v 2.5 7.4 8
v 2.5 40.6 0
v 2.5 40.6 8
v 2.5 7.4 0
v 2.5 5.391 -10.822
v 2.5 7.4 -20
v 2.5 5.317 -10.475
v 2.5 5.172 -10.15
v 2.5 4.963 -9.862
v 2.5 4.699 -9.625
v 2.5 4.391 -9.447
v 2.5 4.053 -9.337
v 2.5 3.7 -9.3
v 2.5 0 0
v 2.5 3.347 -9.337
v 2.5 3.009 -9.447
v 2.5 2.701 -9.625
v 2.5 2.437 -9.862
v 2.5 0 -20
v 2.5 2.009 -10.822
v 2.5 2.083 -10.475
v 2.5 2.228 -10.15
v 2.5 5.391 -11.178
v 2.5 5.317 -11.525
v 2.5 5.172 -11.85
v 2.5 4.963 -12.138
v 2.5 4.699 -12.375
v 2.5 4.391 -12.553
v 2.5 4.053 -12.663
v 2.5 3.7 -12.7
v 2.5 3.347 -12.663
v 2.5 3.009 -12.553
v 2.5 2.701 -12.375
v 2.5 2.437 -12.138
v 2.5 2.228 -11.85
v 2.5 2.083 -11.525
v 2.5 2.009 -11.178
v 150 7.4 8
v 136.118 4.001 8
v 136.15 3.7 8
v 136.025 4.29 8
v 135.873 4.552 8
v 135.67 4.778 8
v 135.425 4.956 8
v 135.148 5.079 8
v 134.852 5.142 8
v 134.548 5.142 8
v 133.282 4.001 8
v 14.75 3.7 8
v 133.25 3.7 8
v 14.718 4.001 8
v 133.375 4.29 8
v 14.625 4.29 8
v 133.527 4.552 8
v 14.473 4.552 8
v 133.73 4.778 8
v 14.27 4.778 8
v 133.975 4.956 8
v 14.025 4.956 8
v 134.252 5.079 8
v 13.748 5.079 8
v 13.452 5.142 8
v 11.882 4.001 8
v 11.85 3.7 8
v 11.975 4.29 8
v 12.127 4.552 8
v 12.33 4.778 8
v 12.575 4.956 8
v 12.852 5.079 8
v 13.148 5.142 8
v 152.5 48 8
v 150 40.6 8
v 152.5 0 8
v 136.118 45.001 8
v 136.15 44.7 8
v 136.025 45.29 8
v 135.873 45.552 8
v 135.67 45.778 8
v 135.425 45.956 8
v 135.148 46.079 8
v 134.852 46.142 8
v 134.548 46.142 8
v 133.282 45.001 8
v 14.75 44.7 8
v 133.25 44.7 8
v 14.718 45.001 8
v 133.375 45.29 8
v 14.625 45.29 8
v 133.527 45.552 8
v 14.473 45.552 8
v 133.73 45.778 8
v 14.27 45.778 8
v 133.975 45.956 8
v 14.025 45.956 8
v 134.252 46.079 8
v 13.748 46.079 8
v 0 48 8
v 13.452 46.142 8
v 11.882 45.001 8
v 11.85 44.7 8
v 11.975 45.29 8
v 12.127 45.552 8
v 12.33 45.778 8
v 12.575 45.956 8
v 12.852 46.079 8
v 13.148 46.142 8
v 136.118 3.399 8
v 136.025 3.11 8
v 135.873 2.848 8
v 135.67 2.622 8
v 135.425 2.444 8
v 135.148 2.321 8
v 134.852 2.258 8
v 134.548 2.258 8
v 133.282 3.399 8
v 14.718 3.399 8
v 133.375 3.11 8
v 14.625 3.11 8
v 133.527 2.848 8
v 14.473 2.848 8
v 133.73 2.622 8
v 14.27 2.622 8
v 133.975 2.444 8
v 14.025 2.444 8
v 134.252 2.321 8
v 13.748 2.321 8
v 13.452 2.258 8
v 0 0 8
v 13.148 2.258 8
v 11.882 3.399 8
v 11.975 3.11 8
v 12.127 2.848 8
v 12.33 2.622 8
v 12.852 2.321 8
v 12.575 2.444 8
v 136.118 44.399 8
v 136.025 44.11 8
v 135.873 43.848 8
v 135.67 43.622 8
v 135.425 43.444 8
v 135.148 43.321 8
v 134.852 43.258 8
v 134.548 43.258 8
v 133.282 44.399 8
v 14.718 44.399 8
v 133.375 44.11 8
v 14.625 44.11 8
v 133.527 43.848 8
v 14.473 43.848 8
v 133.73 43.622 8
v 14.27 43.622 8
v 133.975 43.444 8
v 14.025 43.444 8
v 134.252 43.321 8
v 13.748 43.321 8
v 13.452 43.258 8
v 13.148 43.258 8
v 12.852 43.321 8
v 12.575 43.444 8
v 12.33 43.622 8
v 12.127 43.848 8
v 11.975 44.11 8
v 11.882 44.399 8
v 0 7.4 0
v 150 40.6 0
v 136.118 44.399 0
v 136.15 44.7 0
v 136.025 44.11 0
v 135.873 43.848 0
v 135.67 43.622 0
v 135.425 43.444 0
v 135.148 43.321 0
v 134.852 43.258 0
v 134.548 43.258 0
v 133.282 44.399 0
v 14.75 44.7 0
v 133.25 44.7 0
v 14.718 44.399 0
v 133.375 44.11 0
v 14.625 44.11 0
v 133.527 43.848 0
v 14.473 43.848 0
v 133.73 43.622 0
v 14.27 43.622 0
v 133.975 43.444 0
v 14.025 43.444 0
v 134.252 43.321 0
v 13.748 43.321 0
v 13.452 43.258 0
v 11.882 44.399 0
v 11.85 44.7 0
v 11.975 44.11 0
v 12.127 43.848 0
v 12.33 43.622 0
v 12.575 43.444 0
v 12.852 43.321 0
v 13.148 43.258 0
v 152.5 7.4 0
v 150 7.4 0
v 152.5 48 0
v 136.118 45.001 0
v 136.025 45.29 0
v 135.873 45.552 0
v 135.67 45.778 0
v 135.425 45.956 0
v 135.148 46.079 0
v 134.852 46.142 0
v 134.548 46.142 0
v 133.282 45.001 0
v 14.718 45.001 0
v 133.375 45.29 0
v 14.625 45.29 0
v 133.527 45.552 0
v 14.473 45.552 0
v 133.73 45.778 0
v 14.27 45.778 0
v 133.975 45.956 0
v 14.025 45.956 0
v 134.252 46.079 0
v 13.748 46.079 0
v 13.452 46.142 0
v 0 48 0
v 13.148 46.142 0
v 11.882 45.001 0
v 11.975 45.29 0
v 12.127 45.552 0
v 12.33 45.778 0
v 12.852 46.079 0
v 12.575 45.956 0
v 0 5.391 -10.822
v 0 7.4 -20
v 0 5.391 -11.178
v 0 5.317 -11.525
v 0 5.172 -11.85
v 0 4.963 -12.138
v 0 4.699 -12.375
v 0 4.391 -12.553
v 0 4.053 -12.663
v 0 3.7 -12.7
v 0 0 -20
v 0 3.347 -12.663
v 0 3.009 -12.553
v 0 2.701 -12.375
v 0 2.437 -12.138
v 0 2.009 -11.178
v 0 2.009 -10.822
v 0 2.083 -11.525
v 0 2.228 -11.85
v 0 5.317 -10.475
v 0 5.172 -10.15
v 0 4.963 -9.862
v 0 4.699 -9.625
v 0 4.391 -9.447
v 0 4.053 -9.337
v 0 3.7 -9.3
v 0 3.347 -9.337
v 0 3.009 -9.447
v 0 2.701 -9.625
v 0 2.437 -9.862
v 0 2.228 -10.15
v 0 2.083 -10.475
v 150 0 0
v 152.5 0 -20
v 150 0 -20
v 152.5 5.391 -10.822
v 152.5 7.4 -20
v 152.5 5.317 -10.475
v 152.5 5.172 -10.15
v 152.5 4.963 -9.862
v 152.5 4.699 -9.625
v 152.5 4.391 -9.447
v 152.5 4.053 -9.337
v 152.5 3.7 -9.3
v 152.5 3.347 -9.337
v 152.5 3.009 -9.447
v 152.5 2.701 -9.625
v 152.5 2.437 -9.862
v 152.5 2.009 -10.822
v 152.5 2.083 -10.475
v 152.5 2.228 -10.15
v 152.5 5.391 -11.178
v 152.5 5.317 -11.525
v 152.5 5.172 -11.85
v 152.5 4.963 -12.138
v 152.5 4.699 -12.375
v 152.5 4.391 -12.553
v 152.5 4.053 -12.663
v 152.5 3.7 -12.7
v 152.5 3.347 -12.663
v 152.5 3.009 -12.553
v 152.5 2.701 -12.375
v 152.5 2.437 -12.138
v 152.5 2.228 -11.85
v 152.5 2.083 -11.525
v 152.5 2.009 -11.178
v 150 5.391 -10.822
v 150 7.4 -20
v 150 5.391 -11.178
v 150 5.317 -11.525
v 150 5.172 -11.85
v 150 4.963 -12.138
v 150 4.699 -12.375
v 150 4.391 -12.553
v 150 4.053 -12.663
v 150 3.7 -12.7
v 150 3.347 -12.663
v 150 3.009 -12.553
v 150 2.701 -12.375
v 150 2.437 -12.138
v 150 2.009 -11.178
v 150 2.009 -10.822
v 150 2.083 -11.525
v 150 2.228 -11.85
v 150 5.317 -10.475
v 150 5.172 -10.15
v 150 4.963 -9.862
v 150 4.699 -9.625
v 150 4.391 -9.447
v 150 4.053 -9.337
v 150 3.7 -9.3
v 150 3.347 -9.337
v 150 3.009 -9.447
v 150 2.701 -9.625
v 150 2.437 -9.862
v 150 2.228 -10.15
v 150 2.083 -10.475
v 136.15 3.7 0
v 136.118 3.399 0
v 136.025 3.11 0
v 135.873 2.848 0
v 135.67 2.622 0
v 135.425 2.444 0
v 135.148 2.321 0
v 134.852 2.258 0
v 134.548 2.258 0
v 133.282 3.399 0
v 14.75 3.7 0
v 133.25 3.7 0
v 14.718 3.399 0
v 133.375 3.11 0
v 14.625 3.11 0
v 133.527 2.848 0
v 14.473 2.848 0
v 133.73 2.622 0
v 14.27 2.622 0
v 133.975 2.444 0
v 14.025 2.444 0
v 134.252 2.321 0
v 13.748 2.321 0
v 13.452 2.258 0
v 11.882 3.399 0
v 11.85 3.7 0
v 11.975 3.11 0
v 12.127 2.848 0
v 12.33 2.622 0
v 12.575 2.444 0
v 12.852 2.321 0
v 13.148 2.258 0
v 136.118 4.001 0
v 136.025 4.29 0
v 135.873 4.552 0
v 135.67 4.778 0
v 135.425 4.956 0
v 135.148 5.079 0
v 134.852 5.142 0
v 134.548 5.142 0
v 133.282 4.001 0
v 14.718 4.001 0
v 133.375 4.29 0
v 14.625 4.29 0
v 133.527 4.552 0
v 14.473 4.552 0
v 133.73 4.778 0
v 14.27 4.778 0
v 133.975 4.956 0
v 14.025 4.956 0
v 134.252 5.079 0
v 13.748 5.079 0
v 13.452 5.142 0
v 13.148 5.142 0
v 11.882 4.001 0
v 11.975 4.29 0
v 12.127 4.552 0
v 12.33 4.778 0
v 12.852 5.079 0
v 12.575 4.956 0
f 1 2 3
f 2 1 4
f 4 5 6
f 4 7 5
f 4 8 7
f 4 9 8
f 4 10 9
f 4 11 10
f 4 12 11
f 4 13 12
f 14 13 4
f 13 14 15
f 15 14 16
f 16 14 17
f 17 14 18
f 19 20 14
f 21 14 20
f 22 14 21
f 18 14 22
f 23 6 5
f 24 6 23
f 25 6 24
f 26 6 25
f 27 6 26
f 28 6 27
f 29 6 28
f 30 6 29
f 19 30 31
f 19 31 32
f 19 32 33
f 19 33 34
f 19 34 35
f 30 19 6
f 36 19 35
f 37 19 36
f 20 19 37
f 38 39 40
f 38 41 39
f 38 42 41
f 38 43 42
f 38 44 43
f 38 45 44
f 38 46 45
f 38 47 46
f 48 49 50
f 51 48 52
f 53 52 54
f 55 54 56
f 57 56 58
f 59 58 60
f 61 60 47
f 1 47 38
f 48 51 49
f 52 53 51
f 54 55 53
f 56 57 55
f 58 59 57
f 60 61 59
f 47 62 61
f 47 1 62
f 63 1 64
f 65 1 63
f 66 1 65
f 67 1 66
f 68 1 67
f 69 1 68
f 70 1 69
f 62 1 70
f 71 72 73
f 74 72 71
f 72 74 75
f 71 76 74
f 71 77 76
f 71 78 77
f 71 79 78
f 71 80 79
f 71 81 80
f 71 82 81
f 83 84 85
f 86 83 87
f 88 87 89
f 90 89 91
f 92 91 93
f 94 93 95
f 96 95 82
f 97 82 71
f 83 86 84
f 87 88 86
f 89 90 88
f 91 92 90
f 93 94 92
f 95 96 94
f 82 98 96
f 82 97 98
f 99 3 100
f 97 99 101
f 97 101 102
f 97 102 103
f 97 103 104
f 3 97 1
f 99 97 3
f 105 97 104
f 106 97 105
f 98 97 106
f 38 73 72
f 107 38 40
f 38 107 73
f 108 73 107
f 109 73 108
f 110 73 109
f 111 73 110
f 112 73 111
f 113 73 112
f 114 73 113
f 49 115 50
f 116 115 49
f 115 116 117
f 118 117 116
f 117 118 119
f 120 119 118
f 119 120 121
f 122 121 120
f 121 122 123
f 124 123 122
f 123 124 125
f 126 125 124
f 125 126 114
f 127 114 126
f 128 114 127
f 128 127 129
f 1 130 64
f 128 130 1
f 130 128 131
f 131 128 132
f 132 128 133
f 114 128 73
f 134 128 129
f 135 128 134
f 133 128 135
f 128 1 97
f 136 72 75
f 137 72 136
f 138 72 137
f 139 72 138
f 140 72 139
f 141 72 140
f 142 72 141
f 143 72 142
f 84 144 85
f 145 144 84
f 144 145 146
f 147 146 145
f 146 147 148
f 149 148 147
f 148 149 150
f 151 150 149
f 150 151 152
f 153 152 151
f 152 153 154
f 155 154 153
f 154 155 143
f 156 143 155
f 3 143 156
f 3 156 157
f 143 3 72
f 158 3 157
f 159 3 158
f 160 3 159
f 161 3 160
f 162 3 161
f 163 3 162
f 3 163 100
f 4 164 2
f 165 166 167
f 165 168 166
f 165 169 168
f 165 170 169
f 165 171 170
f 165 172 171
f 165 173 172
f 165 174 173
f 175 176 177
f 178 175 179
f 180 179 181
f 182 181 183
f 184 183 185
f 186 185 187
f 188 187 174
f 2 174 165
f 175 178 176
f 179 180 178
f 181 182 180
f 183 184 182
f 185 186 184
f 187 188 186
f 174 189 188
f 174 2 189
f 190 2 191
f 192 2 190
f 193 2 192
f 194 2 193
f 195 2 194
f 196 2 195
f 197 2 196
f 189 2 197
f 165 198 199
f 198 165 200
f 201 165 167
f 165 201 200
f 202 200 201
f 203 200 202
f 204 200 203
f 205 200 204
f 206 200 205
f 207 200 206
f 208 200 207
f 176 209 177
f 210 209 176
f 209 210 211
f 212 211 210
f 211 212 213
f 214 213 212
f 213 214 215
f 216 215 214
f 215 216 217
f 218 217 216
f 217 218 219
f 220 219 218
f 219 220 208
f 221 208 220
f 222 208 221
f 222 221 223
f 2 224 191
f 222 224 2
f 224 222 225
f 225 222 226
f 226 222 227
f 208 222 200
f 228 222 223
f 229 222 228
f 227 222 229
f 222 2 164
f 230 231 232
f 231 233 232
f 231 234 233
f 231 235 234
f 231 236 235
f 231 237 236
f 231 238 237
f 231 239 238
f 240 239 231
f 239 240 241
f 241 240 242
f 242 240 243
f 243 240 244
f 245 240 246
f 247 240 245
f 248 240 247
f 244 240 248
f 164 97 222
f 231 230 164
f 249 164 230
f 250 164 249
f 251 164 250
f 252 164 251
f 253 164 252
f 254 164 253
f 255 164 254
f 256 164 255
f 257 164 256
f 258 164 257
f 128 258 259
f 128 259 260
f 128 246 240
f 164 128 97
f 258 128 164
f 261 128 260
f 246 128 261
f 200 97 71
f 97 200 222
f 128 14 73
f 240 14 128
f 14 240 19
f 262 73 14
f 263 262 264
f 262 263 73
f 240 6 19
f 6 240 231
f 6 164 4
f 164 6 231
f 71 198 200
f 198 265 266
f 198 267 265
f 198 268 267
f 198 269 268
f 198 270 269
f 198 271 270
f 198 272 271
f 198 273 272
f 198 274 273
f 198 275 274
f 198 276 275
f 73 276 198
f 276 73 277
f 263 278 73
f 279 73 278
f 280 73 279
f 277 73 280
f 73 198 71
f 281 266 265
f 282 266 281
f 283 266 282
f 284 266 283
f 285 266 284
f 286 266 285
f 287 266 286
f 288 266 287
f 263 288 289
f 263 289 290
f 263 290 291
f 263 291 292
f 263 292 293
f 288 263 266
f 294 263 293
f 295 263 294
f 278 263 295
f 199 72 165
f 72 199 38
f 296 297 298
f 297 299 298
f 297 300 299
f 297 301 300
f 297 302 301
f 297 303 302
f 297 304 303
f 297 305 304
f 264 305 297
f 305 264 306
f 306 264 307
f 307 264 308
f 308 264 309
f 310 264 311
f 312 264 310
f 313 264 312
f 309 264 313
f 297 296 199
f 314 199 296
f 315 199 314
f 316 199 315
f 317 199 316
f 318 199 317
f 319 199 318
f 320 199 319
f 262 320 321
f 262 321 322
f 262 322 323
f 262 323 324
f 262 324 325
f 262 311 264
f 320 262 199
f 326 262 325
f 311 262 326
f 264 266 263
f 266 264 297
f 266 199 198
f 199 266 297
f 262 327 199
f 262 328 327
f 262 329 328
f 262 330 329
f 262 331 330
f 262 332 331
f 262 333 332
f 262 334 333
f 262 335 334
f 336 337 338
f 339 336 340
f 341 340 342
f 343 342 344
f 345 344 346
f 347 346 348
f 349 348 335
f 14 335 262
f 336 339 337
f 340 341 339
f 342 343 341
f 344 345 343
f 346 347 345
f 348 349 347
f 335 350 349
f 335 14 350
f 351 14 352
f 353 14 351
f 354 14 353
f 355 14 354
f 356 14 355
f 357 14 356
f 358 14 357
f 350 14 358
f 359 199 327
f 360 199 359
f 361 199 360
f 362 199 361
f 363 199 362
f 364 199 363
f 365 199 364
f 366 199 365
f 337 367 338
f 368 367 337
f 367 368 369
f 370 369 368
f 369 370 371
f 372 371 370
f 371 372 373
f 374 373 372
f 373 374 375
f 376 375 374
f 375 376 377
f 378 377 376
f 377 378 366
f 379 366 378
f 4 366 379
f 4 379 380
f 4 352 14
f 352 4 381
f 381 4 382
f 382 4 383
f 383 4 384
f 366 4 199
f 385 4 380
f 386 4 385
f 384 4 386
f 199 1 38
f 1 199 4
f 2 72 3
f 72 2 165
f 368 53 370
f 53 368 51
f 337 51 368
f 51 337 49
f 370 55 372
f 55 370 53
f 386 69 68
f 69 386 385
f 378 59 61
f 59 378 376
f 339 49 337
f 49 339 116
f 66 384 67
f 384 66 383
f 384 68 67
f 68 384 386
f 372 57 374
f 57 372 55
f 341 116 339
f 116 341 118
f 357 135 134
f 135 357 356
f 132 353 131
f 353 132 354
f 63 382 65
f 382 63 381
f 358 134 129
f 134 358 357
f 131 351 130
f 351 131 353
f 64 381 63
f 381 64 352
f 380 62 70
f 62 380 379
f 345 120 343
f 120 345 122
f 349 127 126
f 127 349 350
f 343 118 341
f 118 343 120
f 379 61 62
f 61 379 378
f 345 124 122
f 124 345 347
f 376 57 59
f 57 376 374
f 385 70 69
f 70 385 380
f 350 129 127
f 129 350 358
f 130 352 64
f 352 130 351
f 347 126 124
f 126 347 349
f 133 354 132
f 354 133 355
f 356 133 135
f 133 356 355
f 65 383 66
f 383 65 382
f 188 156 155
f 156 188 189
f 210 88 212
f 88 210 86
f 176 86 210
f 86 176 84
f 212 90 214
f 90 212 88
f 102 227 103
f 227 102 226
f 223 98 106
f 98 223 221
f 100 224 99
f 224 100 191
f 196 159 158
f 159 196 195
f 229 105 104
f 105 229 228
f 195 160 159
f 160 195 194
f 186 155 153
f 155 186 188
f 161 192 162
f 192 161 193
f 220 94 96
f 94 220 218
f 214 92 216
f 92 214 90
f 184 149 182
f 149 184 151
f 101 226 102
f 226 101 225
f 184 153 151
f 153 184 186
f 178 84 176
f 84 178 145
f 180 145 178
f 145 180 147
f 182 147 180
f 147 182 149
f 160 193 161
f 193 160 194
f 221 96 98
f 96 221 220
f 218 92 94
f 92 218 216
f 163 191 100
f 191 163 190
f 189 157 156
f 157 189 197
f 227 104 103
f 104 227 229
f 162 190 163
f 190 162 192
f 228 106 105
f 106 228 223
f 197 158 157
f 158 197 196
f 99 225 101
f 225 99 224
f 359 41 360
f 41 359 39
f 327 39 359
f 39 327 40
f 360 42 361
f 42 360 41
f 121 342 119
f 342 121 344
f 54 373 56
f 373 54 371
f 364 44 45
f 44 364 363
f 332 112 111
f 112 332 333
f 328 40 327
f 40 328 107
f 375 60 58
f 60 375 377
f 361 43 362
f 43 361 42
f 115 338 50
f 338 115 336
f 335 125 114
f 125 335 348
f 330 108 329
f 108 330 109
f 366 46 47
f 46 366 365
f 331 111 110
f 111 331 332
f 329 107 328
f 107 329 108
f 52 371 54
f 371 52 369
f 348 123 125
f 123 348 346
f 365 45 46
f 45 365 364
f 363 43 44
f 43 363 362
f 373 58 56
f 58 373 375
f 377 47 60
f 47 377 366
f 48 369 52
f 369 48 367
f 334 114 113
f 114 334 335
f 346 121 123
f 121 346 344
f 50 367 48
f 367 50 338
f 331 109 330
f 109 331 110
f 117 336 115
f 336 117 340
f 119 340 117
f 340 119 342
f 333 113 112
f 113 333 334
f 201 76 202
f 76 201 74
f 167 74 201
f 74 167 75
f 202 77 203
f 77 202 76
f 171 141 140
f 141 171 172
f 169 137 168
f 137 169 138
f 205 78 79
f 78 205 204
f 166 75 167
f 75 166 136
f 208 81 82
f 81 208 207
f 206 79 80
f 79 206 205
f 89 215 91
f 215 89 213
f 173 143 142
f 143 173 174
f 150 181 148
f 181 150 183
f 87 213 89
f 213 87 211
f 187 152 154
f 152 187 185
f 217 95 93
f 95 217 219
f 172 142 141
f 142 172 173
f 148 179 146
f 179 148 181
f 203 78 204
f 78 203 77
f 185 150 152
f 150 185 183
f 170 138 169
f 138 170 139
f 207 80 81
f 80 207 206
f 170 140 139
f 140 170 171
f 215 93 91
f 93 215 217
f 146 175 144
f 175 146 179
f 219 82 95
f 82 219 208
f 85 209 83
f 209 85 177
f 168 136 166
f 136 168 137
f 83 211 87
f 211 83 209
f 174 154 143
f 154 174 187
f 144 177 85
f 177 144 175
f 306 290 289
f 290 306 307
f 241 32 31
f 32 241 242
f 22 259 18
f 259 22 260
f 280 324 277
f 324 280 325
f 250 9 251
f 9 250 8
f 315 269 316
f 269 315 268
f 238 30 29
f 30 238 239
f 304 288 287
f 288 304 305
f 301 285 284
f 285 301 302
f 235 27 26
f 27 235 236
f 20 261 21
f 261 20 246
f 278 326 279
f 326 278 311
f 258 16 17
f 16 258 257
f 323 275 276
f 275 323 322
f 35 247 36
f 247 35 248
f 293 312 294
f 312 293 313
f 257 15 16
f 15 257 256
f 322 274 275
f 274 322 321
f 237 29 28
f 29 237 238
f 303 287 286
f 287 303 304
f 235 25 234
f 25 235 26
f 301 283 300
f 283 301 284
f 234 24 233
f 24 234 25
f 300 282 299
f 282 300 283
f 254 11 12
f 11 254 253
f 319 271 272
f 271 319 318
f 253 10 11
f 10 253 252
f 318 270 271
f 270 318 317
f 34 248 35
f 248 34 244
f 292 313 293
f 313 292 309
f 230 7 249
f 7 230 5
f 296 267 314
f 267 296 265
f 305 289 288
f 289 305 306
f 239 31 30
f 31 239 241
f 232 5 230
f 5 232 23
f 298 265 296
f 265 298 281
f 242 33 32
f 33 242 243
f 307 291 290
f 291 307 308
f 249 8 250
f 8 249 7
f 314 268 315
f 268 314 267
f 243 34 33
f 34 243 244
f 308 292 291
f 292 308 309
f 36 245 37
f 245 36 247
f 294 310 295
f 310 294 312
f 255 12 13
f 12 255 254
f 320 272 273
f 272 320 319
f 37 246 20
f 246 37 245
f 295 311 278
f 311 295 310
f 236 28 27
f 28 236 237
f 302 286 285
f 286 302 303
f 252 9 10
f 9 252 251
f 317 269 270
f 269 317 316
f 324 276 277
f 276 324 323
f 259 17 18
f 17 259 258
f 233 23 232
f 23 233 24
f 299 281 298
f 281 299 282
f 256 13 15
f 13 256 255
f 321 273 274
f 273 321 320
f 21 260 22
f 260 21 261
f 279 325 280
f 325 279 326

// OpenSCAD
$fn = 30;

wall = 2.5;
pcb_sz_x = 128.4;
pcb_sz_y = 48;
pcb_under_sz_z = 8;
bar_sz_x = 150;
bar_sz_y = 7.4;
bar_dist_y = pcb_sz_y - 2 * bar_sz_y;

hole_dist_y = 41;
hole_dist_x = 121.4;

attach_down_hole_dist_z = 11;

//union() {
difference() {
	for(yp=[0, 1]) {
		translate([wall, yp*(bar_sz_y+bar_dist_y), 0]) {		
			cube([bar_sz_x, bar_sz_y, pcb_under_sz_z]);
			if(yp==0) {
				for(xp=[0, 1]) {
					translate([xp*bar_sz_x-wall, 0, 0]) {
						cube([wall, 2*bar_sz_y+bar_dist_y, pcb_under_sz_z]);
						translate([0, 0, -20]) {
							cube([wall, bar_sz_y, 20+pcb_under_sz_z]);
						}
					}
				}
			}
		}
	}
	translate([0, (bar_sz_y+bar_dist_y+2*bar_sz_y-pcb_sz_y)/2, 0]) {
		translate([wall+(bar_sz_x-pcb_sz_x)/2, 0, -25]) {
			for(xp=[0, hole_dist_x]) {
				for(yp=[0, hole_dist_y]) {
					translate([xp, yp, 0]) {
						cylinder(d=2.9, h=50);
					}
				}
			}
		}
		translate([-bar_sz_x/2, 0, -attach_down_hole_dist_z]) {
			rotate([0, 90, 0]) {
				cylinder(d=3.4, h=bar_sz_x*2);
			}
		}
	}
}
